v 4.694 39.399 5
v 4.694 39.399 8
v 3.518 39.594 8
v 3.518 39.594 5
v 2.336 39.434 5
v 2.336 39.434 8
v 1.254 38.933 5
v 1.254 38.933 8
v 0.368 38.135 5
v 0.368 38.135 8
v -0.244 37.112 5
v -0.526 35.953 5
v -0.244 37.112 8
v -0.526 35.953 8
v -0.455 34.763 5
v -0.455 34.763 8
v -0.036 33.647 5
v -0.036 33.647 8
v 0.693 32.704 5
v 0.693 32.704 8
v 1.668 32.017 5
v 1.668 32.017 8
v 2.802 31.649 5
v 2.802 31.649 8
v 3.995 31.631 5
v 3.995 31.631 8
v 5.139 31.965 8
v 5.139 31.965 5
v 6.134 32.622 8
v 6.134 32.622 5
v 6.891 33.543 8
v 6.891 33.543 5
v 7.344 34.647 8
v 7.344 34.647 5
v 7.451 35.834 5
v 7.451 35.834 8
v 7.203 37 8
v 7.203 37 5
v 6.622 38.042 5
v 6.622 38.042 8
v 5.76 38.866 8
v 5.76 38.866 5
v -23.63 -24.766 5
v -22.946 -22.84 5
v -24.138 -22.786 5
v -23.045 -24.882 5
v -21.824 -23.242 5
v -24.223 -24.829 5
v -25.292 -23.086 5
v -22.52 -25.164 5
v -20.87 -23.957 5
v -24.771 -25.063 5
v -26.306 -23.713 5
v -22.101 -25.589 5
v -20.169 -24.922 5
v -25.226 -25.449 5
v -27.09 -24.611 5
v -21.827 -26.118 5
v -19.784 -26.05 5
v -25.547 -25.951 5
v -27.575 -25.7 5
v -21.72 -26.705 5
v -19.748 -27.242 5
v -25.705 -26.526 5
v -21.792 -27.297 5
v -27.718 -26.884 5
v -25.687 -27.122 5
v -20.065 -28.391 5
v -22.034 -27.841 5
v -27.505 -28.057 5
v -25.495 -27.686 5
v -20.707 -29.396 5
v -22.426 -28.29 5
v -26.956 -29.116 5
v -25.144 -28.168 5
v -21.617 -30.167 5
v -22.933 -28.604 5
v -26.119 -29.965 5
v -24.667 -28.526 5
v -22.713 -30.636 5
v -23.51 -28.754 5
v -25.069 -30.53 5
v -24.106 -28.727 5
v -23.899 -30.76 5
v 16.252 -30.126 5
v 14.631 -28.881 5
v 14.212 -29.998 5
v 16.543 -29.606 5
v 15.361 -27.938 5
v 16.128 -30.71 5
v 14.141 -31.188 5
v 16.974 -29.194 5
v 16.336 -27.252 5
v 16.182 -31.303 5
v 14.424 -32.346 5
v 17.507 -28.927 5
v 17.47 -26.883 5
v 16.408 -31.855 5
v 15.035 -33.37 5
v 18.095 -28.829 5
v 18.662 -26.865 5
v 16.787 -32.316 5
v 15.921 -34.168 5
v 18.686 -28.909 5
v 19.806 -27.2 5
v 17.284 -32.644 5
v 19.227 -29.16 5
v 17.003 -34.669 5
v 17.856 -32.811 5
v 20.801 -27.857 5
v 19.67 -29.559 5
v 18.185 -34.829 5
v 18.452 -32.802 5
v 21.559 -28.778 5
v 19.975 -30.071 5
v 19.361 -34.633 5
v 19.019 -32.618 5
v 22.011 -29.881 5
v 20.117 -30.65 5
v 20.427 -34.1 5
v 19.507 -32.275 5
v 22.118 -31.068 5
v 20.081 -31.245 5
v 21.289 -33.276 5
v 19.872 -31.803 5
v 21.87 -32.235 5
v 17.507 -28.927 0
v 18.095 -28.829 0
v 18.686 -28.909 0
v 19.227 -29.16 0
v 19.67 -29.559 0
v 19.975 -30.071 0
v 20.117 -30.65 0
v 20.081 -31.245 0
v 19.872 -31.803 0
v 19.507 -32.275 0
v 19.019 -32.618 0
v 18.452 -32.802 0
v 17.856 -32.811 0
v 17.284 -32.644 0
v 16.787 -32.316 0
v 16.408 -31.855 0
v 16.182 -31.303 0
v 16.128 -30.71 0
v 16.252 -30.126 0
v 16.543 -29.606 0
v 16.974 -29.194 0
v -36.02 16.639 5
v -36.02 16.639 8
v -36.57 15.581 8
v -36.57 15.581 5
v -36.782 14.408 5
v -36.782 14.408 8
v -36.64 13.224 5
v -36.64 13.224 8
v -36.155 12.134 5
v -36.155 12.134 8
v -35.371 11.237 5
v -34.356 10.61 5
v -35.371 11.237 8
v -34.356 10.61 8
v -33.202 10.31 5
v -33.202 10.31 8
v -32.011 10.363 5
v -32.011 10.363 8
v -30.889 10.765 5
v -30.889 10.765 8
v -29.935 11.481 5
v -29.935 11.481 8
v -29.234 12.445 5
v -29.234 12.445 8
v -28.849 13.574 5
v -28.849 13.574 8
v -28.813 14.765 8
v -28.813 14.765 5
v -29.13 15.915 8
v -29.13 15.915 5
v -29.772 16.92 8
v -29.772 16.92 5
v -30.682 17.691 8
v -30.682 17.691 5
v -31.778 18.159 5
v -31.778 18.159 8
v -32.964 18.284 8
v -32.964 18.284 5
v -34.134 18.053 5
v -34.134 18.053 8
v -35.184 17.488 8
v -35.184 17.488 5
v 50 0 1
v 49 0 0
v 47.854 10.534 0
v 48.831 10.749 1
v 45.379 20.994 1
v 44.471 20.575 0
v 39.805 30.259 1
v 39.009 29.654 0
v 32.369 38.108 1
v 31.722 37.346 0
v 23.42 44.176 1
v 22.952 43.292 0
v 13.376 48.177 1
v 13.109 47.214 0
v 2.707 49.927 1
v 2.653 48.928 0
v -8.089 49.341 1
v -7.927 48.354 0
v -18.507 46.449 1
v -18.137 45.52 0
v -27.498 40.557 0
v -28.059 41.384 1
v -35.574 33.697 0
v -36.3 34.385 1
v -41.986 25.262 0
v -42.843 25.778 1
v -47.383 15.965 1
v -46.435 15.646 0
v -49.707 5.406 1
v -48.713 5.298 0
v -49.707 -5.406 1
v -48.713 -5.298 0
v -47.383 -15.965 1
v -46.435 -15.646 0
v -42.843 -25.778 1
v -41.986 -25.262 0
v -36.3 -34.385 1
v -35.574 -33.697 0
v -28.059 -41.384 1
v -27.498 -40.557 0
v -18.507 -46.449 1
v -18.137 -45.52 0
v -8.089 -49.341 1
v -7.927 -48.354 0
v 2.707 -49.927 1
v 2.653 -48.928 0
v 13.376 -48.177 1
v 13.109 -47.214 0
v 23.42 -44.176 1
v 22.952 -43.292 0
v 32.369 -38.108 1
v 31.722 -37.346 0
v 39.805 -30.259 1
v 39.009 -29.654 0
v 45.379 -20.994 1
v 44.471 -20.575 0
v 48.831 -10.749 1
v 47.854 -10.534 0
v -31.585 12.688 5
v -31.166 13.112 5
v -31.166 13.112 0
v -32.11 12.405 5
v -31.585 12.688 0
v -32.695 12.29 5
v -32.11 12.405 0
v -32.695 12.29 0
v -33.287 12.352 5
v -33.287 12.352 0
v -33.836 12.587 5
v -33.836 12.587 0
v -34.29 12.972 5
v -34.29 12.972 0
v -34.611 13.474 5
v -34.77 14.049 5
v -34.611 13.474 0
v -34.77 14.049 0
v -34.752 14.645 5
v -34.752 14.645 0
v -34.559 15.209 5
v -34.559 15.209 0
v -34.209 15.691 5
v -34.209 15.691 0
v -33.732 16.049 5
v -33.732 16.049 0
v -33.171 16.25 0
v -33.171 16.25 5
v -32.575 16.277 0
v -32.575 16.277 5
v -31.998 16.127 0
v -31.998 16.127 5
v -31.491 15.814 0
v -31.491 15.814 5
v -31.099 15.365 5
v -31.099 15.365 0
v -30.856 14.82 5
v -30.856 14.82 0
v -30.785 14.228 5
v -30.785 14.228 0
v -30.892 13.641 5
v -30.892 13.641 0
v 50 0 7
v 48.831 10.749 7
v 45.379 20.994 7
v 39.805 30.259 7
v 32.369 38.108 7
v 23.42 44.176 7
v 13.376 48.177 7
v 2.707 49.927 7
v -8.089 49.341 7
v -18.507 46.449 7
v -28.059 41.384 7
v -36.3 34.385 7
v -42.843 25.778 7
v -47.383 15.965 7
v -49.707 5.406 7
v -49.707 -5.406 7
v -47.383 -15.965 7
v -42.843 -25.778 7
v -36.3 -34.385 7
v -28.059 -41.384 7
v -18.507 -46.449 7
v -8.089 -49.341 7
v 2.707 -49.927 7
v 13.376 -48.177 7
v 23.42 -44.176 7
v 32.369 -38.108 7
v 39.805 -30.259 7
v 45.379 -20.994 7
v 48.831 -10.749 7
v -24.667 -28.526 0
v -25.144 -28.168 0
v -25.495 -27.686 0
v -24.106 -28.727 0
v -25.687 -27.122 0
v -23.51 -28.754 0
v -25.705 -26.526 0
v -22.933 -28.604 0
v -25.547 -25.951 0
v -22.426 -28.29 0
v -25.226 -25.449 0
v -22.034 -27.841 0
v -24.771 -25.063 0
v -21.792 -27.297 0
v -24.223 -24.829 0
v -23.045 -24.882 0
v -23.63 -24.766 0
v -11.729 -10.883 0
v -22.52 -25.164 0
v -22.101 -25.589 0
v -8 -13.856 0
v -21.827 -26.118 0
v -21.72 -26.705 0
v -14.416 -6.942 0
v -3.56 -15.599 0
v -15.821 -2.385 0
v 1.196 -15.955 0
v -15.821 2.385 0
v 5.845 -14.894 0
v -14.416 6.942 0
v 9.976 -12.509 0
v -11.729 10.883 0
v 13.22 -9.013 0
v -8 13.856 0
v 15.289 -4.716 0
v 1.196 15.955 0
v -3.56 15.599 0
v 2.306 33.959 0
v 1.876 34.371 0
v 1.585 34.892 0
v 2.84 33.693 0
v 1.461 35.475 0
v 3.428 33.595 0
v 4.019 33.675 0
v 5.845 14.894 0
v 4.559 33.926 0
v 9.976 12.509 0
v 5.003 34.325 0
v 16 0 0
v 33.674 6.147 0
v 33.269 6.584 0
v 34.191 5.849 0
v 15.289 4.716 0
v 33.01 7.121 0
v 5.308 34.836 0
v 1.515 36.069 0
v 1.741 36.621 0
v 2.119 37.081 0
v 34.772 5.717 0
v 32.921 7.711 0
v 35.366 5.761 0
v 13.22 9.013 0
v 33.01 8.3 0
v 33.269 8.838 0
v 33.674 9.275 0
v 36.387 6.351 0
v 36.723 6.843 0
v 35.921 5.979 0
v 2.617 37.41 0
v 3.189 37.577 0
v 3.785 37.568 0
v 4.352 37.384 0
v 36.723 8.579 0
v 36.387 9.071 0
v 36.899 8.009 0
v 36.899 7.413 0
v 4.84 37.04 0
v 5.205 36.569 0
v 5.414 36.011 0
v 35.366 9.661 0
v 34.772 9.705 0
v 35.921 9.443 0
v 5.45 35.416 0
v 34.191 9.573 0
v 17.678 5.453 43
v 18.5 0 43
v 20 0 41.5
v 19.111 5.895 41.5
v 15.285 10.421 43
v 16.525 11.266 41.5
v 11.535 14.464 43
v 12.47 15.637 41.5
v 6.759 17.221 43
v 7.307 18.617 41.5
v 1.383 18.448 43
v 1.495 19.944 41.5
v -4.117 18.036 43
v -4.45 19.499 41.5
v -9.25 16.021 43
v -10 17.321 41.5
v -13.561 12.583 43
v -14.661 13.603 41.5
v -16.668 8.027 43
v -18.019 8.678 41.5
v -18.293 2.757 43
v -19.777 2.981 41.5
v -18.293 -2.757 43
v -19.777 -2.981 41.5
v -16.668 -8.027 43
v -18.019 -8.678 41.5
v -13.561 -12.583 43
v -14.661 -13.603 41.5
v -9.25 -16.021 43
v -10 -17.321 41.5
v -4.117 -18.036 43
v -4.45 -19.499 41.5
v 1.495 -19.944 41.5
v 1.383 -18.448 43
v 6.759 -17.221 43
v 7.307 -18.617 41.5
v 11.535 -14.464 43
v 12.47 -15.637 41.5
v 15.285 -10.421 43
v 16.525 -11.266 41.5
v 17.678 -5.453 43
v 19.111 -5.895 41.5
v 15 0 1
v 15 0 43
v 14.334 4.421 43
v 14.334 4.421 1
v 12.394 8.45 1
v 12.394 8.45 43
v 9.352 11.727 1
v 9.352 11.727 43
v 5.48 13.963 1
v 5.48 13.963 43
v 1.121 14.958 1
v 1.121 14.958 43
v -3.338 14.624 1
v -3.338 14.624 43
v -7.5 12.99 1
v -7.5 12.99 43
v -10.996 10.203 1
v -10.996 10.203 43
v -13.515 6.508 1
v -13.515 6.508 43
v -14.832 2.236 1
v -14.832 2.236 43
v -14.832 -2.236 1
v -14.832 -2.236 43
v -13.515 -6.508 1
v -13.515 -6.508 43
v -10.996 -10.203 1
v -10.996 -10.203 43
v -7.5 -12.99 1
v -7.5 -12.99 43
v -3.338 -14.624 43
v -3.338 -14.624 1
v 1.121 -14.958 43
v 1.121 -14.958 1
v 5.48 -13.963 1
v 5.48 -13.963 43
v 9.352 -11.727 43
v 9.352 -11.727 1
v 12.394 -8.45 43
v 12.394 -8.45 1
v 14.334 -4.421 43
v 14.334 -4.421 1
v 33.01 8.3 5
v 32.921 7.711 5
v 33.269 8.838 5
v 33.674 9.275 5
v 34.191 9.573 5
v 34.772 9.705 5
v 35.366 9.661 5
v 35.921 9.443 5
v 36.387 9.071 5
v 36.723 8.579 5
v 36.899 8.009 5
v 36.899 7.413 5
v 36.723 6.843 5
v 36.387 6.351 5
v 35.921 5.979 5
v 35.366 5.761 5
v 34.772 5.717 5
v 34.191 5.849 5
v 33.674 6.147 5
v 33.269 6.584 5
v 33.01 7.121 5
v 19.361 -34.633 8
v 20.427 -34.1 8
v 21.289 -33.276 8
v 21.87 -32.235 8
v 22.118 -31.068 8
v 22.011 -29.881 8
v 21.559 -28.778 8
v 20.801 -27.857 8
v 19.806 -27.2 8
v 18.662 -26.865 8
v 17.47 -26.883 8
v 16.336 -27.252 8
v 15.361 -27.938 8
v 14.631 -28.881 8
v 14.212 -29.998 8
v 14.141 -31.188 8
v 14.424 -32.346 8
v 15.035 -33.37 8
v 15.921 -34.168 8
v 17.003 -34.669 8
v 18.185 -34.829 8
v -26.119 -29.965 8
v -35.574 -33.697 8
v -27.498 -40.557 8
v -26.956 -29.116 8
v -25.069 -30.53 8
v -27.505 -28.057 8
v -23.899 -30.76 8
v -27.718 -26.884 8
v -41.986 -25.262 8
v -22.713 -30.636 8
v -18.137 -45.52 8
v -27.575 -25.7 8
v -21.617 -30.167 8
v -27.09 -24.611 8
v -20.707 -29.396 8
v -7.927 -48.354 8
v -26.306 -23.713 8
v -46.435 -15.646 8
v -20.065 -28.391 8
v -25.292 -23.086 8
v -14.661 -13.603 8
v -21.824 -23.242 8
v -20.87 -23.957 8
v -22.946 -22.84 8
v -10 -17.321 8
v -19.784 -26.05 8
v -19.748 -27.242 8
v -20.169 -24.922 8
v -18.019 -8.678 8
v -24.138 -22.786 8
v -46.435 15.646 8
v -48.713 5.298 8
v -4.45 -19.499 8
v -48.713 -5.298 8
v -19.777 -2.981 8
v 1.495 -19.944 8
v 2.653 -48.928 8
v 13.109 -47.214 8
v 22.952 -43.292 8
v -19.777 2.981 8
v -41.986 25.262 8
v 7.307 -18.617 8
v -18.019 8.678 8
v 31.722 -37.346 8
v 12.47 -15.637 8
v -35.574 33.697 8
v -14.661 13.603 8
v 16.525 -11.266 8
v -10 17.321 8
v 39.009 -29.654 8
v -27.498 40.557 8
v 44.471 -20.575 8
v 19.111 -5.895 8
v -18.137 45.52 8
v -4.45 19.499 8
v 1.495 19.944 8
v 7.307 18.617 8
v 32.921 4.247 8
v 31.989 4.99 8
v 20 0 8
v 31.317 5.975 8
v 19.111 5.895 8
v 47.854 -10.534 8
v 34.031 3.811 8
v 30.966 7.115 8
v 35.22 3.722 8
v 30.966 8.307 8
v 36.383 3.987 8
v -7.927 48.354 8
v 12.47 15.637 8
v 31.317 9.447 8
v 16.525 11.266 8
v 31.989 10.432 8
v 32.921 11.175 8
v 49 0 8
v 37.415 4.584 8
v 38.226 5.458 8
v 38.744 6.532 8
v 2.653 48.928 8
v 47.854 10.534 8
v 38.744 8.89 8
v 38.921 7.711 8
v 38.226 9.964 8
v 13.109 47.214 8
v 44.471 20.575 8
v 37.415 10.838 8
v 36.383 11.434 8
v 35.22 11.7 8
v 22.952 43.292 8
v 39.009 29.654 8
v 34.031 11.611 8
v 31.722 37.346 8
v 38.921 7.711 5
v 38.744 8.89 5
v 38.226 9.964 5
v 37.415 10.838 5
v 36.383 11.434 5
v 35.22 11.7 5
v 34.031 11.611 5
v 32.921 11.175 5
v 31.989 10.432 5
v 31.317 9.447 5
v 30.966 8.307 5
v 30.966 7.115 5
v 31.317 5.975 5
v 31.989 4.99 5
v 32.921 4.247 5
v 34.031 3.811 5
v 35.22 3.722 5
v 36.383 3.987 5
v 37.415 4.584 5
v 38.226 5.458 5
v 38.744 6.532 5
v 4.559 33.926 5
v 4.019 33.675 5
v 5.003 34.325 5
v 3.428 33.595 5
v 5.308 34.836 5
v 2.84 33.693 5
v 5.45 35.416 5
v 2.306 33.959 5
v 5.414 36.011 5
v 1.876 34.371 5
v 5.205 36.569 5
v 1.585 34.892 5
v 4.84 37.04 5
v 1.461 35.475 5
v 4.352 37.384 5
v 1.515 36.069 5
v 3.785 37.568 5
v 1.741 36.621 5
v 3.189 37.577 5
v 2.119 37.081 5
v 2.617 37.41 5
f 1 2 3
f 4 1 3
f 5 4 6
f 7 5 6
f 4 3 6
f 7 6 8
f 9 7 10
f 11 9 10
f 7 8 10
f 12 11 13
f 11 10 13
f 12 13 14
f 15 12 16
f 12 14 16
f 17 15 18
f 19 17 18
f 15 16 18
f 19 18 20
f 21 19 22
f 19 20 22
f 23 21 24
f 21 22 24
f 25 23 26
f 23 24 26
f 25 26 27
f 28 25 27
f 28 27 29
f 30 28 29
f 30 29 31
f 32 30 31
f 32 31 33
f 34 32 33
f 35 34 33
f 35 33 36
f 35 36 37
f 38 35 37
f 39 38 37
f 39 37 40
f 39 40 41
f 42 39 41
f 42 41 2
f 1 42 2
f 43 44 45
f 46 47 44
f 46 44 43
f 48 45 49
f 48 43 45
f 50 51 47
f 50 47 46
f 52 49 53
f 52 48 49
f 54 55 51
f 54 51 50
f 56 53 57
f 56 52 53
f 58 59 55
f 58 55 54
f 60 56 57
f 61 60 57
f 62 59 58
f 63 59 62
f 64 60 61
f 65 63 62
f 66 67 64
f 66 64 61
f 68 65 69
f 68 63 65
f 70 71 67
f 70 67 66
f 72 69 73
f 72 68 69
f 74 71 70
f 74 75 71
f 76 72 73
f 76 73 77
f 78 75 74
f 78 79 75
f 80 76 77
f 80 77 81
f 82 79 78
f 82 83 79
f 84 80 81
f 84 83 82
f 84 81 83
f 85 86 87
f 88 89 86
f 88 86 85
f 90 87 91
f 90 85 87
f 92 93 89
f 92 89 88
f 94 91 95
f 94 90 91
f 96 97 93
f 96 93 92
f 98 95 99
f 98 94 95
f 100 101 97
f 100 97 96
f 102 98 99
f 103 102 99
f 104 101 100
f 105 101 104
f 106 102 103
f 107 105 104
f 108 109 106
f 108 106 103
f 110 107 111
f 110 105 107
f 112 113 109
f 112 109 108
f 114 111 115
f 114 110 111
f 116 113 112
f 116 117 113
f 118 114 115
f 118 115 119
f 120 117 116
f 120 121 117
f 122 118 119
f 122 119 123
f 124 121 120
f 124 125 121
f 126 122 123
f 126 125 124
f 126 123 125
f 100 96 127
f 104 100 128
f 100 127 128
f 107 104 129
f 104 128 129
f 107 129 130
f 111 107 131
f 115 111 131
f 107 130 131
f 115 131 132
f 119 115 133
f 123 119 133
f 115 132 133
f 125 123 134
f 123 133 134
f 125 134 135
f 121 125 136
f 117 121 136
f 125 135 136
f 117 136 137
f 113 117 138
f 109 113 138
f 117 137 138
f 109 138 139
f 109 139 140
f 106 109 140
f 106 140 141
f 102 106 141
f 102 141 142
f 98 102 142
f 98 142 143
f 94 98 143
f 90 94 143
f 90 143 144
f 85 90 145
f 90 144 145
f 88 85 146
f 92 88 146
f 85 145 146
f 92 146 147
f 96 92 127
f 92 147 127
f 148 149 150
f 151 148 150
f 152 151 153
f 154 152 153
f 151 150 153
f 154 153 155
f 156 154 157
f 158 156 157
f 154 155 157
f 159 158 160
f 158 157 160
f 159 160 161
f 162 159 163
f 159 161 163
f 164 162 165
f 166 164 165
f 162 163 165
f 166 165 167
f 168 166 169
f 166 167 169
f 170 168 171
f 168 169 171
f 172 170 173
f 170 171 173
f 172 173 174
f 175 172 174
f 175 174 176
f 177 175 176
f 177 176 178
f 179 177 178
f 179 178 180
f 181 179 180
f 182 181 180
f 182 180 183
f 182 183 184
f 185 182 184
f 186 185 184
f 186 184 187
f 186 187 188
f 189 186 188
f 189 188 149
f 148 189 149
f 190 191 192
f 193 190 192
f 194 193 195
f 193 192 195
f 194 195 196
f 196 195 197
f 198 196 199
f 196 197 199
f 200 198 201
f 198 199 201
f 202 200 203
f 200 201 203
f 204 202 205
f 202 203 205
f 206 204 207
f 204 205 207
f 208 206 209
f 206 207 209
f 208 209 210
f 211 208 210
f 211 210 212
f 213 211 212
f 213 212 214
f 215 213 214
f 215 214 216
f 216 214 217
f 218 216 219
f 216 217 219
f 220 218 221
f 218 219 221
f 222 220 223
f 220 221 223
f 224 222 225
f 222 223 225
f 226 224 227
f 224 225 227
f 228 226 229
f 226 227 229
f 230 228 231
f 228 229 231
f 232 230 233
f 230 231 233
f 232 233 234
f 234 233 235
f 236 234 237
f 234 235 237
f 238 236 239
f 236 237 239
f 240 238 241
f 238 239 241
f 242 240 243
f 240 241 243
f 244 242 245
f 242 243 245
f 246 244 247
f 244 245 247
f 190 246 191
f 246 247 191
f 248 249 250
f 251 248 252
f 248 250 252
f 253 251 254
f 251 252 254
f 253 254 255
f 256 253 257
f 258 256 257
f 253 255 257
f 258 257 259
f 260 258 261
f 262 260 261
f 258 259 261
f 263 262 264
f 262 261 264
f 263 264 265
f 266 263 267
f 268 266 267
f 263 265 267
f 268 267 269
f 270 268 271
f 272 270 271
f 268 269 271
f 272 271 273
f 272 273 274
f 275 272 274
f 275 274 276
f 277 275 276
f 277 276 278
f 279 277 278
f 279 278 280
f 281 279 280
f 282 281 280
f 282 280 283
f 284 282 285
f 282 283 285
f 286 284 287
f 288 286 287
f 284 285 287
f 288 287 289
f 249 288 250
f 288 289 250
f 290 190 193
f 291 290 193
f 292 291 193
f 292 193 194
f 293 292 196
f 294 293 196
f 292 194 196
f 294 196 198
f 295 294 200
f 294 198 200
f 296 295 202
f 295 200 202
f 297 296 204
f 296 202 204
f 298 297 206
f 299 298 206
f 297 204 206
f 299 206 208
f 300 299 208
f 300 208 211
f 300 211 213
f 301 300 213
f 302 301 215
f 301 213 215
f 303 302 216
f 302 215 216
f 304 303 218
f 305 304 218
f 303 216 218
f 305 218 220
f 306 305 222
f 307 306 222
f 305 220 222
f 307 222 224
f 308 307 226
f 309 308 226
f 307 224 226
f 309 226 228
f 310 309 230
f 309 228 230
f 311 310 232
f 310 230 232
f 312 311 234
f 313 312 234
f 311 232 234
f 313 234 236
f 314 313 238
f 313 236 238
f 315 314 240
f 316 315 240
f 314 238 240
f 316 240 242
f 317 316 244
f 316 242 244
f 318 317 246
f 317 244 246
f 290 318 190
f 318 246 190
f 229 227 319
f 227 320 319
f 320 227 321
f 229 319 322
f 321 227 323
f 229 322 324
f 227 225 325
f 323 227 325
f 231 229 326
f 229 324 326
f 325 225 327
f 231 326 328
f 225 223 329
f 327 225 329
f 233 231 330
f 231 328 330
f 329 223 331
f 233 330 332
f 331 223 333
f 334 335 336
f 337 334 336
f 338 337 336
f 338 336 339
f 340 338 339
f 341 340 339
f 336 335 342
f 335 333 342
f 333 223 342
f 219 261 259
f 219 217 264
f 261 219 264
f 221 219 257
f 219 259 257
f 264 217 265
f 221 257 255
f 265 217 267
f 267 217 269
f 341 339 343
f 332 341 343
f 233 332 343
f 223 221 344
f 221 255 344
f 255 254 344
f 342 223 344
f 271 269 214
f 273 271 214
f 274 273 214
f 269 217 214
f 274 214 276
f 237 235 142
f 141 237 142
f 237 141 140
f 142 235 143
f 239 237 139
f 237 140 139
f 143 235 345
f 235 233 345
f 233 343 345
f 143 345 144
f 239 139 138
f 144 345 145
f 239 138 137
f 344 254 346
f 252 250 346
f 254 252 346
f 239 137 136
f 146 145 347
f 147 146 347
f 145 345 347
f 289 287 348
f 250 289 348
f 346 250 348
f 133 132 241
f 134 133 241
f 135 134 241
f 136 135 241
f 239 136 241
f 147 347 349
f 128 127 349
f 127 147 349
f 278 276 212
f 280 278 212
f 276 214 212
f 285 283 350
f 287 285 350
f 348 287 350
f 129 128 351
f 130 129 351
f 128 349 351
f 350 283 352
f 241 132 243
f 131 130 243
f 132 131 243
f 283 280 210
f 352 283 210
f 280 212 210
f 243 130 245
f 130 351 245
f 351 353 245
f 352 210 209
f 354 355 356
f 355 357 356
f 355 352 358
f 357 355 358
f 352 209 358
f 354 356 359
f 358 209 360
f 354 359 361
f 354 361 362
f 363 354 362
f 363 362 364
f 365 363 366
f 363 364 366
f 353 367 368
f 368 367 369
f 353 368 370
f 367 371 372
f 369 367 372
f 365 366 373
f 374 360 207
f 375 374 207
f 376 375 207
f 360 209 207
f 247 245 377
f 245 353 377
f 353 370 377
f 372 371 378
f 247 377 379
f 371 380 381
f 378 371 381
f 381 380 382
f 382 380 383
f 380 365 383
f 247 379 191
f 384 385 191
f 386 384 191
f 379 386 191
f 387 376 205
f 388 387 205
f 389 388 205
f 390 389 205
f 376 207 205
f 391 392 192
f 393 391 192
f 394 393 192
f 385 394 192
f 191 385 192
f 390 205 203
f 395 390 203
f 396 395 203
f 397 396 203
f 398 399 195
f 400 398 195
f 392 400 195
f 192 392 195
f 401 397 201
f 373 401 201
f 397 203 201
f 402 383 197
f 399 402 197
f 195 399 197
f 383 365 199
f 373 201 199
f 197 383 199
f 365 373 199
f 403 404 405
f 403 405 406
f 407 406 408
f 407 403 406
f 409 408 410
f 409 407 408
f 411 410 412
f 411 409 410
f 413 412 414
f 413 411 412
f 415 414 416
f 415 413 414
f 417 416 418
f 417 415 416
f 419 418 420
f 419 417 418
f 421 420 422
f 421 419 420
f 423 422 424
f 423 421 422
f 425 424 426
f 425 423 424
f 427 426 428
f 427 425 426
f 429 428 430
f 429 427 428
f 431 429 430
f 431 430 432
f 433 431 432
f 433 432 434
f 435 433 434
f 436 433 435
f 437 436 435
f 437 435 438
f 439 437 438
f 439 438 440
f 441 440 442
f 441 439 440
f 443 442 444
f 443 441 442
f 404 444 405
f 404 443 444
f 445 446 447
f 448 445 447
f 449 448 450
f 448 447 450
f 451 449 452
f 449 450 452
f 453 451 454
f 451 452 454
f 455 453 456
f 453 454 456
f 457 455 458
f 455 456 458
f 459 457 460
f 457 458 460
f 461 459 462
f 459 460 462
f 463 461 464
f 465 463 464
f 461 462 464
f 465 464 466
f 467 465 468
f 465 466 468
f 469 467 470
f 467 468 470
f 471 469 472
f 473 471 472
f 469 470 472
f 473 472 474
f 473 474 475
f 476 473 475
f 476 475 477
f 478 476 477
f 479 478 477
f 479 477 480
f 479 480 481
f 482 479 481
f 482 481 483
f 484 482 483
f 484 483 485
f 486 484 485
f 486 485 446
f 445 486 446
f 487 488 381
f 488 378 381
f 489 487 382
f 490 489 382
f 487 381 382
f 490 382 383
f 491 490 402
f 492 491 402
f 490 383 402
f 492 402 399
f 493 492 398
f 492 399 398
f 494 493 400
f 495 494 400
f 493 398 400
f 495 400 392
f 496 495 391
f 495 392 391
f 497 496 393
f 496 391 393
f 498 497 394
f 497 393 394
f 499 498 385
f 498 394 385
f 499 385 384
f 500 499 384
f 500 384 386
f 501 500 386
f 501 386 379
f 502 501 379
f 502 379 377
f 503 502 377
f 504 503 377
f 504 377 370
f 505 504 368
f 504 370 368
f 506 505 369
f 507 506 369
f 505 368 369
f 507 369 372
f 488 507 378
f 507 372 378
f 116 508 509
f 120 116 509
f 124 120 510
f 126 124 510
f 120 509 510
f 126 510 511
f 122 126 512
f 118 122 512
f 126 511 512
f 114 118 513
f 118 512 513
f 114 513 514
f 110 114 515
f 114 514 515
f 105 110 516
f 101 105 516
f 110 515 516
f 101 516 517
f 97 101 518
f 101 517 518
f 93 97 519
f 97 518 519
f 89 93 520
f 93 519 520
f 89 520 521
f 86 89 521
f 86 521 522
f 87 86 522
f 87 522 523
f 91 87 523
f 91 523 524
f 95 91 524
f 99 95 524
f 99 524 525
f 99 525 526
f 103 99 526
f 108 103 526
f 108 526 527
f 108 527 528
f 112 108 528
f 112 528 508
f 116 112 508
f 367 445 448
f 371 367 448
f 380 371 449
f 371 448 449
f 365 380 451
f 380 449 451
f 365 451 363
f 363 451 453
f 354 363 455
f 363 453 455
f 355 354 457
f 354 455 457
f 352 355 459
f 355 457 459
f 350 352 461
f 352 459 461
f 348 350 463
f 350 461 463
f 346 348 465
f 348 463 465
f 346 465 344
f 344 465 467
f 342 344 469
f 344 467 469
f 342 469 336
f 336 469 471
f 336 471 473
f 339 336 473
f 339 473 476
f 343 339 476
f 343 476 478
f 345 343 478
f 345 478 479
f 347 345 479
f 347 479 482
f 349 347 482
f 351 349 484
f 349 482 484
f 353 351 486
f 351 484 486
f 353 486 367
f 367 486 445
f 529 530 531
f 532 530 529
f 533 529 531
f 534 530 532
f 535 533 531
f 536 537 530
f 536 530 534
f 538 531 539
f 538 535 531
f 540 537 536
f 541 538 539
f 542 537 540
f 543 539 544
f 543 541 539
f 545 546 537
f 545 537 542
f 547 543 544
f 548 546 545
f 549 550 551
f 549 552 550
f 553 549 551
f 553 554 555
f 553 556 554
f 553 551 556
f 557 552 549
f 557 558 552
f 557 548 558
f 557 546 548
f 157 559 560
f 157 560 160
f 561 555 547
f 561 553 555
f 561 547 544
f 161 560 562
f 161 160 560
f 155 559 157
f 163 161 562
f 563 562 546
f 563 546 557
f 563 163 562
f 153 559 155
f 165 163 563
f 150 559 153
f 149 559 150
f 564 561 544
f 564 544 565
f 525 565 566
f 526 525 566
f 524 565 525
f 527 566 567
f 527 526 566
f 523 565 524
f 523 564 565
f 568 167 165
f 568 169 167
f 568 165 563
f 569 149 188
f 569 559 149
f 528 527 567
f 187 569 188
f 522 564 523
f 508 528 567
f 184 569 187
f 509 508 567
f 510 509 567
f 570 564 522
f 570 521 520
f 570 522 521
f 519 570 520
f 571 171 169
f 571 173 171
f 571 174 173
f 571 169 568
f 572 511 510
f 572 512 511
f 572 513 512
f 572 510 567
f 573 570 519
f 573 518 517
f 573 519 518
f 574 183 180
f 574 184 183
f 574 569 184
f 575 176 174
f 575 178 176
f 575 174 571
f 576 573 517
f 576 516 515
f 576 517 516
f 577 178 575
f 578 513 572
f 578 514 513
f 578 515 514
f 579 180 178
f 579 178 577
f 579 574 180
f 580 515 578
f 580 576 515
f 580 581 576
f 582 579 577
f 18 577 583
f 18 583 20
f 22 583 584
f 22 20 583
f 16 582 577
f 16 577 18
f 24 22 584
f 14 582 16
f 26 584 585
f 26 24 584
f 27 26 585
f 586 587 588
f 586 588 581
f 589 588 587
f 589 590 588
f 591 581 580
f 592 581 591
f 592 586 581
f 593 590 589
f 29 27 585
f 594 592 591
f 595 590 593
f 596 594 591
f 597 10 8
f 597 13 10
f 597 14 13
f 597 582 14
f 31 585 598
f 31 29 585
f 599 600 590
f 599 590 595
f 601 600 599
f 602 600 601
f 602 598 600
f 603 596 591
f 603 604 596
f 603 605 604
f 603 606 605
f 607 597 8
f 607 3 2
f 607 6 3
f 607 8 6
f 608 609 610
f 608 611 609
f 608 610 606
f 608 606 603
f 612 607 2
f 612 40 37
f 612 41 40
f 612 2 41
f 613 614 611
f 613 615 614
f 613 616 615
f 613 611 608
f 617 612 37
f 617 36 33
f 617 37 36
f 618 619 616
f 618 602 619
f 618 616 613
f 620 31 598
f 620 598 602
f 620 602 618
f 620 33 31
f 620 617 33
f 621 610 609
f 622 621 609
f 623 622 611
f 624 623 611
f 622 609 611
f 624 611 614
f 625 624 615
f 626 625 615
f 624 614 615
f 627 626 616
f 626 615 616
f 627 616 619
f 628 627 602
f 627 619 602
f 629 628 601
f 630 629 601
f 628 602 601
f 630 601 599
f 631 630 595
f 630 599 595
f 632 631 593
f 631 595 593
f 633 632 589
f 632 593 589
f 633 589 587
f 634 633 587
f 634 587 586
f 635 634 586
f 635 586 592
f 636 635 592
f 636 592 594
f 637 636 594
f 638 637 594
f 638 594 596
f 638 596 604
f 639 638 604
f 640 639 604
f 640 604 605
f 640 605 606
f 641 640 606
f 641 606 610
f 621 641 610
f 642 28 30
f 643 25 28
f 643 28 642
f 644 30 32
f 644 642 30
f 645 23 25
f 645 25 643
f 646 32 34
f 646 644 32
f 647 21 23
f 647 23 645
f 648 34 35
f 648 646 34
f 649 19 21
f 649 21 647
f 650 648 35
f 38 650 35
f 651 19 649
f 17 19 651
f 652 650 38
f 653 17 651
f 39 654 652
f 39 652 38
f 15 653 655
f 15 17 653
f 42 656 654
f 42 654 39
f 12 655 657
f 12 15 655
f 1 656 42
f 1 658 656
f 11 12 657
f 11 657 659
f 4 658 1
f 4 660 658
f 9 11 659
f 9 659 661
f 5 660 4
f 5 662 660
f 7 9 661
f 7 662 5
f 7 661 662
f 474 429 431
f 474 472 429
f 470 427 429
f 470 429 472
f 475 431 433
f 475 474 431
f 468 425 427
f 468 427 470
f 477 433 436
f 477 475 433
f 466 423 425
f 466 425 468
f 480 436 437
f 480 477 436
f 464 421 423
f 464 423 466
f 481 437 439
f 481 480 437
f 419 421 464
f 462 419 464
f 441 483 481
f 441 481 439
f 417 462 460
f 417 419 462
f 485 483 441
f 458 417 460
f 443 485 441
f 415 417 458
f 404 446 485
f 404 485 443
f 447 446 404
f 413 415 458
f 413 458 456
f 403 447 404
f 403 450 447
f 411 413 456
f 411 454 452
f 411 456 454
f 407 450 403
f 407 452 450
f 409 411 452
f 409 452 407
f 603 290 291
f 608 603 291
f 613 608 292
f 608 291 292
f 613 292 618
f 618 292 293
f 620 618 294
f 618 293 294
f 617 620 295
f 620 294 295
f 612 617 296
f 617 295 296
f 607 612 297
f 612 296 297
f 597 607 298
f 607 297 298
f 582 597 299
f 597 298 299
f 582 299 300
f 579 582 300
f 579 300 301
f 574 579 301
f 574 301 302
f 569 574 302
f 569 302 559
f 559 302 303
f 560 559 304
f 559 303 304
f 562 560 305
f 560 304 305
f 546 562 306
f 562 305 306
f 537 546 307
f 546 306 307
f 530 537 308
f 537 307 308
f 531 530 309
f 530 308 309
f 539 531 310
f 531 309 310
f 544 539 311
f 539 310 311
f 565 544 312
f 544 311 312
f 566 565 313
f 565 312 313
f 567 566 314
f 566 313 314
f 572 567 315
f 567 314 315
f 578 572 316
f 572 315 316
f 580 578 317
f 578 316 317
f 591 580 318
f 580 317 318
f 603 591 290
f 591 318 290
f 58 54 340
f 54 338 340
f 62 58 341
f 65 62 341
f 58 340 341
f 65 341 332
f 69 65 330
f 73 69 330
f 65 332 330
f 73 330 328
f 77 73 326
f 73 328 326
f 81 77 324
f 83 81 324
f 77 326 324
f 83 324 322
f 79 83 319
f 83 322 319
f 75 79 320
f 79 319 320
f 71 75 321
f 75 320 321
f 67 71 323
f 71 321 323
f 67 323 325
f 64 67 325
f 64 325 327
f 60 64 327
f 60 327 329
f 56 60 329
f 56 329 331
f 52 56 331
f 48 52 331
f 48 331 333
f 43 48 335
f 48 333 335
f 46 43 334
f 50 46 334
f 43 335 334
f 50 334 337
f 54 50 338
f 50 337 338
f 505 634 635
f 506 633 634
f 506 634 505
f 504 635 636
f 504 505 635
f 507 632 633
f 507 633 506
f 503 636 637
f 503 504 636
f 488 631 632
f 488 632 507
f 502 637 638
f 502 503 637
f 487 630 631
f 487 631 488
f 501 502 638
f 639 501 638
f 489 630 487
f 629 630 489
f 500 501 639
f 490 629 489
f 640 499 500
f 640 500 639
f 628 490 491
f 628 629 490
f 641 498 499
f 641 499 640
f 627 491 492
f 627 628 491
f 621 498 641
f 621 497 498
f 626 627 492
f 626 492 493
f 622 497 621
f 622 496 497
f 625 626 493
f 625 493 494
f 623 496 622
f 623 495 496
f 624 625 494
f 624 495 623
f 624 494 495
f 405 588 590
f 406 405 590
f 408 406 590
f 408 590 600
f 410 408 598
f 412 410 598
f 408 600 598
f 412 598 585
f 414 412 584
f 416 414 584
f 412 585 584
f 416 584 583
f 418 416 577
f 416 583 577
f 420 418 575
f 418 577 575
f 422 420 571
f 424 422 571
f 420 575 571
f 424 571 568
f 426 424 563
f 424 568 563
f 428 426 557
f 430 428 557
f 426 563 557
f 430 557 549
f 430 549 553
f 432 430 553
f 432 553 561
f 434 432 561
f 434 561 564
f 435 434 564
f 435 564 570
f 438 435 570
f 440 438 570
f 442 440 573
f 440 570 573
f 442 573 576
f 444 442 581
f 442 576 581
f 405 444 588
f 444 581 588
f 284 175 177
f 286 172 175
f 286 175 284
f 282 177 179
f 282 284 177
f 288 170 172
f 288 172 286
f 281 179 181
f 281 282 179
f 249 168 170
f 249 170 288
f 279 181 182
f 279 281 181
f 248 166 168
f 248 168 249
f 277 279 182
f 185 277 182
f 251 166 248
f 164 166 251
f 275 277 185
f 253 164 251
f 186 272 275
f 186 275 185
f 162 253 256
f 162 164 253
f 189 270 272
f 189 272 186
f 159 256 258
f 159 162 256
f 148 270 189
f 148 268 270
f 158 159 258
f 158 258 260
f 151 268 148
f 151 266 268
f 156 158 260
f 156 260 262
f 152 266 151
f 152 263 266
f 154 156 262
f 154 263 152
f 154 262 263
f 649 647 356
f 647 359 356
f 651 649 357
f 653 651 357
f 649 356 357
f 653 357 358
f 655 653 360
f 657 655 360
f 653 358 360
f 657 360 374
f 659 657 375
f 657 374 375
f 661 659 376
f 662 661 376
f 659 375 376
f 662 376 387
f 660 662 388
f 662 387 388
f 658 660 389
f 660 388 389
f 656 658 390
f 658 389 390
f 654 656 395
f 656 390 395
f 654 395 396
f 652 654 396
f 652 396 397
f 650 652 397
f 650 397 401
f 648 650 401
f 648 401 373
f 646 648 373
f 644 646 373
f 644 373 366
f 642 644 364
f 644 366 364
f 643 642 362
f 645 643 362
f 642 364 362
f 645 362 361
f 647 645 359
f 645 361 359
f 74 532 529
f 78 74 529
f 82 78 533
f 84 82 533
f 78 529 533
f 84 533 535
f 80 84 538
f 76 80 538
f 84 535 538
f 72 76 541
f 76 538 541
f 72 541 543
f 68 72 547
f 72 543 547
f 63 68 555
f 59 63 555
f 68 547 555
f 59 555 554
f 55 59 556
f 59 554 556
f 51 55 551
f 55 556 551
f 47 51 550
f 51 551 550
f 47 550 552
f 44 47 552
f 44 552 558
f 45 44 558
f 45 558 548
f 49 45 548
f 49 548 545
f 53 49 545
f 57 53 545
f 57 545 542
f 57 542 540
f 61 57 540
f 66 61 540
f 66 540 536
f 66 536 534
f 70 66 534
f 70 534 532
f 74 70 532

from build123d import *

# Parameters (mm, degrees)
F0_R            = 50
F1_DEPTH        = 8
F2_R            = 20
F3_DEPTH        = 35
F5_D            = 4
F5_DEPTH        = 12
F5_CBORE_D      = 8
F5_CBORE_DEPTH  = 3
F5_TIP          = 1.2017212381
F5_COPIES_COUNT = 5
F6_SIZE         = 1.5
F7_R            = 15
F8_DEPTH        = 43.001
F9_SIZE         = 1
F10_SIZE        = 1


# Not quite as in the source:
# - a pattern or mirror of a feature is missing from the dataset's text; its kind, count and spacing are read off the source's solid


with BuildPart() as f1:
    # F0 (on Top) → F1 (new body)
    with BuildSketch(Plane.XY):
        Circle(F0_R)
    extrude(amount=F1_DEPTH)

    # F2 (on face) → F3 (join)
    with BuildSketch(Plane.XY.offset(8)):
        Circle(F2_R)
    extrude(amount=F3_DEPTH)

    # F5
    with Locations(Plane.XY.offset(8)):
        with Locations((34.9212251604, 7.7109653503)):
            f5 = CounterBoreHole(F5_D / 2, F5_CBORE_D / 2, F5_CBORE_DEPTH, depth=F5_DEPTH)
            with Locations((0, 0, -(F5_DEPTH + F5_TIP / 2))):  # 118° drill point
                Cone(0, F5_D / 2, F5_TIP, mode=Mode.SUBTRACT)

    # F5_copies: F5 ×5 about axis
    f5_copies_axis = Axis((0, 0, 0), (0, 0, 1))
    for i in range(1, F5_COPIES_COUNT):
        add(f5.rotate(f5_copies_axis, i * 360 / F5_COPIES_COUNT), mode=Mode.SUBTRACT)

    # F6
    f6_edges = [f1.edges().sort_by_distance(p)[0] for p in [
        (-20, 0, 43),
    ]]
    chamfer(f6_edges, length=F6_SIZE)

    # F7 (on face) → F8 (cut, through all)
    with BuildSketch(Plane.XY.offset(43)):
        Circle(F7_R)
    extrude(amount=-F8_DEPTH, mode=Mode.SUBTRACT)

    # F9
    f9_edges = [f1.edges().sort_by_distance(p)[0] for p in [
        (-50, 0, 8),
        (-50, 0, 0),
    ]]
    chamfer(f9_edges, length=F9_SIZE)

    # F10
    f10_edges = [f1.edges().sort_by_distance(p)[0] for p in [
        (-15, 0, 0),
    ]]
    chamfer(f10_edges, length=F10_SIZE)


solid = f1.part
